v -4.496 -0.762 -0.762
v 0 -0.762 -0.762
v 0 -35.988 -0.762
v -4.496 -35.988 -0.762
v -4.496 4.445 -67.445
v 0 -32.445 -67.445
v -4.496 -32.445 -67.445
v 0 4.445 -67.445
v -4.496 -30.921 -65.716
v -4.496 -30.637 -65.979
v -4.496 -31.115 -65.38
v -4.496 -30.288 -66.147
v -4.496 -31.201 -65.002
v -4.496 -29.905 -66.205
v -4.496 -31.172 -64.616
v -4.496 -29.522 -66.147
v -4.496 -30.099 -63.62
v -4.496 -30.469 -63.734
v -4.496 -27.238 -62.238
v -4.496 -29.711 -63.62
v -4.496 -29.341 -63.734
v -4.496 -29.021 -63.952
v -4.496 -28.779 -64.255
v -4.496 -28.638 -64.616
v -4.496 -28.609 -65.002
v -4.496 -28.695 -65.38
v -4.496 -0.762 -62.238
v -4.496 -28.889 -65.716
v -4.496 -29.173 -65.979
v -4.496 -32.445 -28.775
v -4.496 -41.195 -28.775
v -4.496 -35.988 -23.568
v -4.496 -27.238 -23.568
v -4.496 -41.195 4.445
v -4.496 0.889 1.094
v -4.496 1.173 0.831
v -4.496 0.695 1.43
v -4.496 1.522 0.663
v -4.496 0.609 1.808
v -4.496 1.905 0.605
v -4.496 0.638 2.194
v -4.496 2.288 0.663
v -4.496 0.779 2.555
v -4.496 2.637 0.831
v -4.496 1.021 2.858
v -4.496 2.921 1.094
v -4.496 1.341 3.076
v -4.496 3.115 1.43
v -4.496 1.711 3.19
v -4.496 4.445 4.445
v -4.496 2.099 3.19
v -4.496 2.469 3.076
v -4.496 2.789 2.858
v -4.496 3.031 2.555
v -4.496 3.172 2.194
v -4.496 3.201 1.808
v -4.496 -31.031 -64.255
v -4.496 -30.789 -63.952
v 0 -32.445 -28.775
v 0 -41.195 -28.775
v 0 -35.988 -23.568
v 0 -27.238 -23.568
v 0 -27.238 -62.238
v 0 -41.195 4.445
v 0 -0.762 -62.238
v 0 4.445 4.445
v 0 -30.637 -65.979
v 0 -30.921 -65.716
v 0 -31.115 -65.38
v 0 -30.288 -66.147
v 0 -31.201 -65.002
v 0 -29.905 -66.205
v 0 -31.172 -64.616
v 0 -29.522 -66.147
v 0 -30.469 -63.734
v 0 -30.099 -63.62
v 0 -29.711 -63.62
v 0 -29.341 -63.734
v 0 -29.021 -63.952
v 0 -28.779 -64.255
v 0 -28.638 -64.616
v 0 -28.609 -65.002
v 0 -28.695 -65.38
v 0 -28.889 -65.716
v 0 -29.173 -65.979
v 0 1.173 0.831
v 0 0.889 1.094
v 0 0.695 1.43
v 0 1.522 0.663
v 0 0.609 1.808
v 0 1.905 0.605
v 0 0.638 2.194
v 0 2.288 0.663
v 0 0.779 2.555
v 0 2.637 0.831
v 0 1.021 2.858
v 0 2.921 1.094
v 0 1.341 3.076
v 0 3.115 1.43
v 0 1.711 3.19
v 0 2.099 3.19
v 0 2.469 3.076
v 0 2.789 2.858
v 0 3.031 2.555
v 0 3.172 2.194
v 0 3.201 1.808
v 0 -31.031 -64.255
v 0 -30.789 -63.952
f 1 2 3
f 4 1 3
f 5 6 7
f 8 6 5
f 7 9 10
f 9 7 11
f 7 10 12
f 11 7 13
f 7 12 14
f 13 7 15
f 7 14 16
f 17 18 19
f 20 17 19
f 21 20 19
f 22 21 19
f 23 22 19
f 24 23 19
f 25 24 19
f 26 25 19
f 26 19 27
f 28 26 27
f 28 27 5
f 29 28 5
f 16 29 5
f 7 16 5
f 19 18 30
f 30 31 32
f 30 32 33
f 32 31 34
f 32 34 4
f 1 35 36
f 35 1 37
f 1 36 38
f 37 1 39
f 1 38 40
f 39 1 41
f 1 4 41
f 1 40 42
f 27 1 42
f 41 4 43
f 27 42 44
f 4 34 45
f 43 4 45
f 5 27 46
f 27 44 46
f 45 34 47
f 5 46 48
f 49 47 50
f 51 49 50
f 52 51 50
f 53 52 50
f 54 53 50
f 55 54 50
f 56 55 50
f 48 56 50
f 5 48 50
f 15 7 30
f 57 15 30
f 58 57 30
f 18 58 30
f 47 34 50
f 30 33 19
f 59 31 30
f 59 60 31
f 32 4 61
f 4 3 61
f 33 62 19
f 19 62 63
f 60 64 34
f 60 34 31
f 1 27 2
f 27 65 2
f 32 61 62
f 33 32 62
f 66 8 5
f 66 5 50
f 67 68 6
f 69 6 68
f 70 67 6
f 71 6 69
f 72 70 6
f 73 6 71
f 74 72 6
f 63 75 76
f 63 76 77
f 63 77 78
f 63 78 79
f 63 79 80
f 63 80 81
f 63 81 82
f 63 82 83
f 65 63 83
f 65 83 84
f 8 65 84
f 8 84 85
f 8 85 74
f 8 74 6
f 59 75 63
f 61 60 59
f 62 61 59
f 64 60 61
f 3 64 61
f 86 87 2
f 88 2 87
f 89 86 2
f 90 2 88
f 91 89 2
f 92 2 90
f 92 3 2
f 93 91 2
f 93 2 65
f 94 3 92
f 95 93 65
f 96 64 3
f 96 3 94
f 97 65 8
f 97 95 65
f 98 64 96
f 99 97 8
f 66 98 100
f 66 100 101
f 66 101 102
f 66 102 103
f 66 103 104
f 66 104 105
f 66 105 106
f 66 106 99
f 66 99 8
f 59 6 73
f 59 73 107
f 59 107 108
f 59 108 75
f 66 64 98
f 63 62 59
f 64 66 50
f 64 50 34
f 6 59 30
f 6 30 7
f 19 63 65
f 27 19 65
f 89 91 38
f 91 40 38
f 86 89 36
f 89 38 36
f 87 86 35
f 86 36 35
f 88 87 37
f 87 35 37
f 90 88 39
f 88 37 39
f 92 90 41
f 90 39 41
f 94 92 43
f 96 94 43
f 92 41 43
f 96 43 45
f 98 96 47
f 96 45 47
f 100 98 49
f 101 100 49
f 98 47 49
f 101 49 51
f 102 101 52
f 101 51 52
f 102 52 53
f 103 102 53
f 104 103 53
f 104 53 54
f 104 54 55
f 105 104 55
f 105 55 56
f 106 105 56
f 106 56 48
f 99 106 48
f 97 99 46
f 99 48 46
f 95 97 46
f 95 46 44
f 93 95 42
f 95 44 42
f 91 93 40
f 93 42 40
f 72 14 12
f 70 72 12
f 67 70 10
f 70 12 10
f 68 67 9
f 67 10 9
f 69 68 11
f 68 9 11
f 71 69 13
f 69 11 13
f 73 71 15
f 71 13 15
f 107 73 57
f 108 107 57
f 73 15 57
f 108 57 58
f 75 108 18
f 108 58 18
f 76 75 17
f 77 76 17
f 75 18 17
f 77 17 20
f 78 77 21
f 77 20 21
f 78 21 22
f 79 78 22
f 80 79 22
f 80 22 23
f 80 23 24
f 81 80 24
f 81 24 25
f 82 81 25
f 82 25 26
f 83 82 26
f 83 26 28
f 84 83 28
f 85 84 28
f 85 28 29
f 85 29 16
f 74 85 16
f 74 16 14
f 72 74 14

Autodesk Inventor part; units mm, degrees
ref_plane "YZ Plane" through (0, 0, 0) normal (1, 0, 0) x (0, 1, 0)
ref_plane "XZ Plane" through (0, 0, 0) normal (0, 1, 0) x (-1, 0, 0)
ref_plane "XY Plane" through (0, 0, 0) normal (0, 0, 1) x (1, 0, 0)
sketch "Sketch1" plane through (0, 0, 0) normal (1, 0, 0) x (0, 1, 0)
  line L0 (0, 18.823) -> (0, -81.823) projected
  line L1 (-50.323, 0) -> (13.573, 0) projected
  line L2 (0, 0) -> (0, -63)
  line L3 (0, -63) -> (-28, -63)
  line L4 (-28, -63) -> (-28, -24.33)
  line L5 (-28, -24.33) -> (-36.75, -24.33)
  line L6 (-36.75, -24.33) -> (-36.75, 0)
  line L7 (-36.75, 0) -> (0, 0)
  circle A0 centre (-16, -42.5) radius 1.575 construction
  line L8 (-35.988, -0.762) -> (-35.988, -23.568)
  line L9 (-35.988, -23.568) -> (-27.238, -23.568)
  line L10 (-27.238, -23.568) -> (-27.238, -62.238)
  line L11 (-27.238, -62.238) -> (-0.762, -62.238)
  line L12 (-0.762, -62.238) -> (-0.762, -0.762)
  line L13 (-0.762, -0.762) -> (-35.988, -0.762)
  line L14 (-41.195, 4.445) -> (-41.195, -28.775)
  line L15 (-41.195, -28.775) -> (-32.445, -28.775)
  line L16 (-32.445, -28.775) -> (-32.445, -67.445)
  line L17 (-32.445, -67.445) -> (4.445, -67.445)
  line L18 (4.445, -67.445) -> (4.445, 4.445)
  line L19 (4.445, 4.445) -> (-41.195, 4.445)
  line L20 (1.905, 1.905) -> (-29.905, 1.905) construction
  line L21 (-29.905, 1.905) -> (-29.905, -64.905) construction
  line L22 (-29.905, -64.905) -> (1.905, -64.905) construction
  line L23 (1.905, -64.905) -> (1.905, 1.905) construction
  dimension "d0" = 63
  dimension "d1" = 28
  dimension "d2" = 36.75
  dimension "d3" = 24.33
  dimension "d4" = 42.5
  dimension "d5" = 16
  dimension "d6" = 3.15
  dimension "d16" = 0.762
  dimension "d17" = 4.445
  dimension "d18" = 2.54
  dimension "d19" = 2.54
  dimension "d20" = 2.54
  dimension "d21" = 2.54
  dimension "d29" = 66.81
  dimension "d30" = 31.81
extrude "Extrusion1" add sketch "Sketch1" against normal blind 4.4958
hole "Hole1" at (0, -16, -42.5) direction (-1, 0, 0) diameter 3.15 end through all
hole "Hole2" at (0, 1.905, 1.905) at (0, -29.905, -64.905) direction (-1, 0, 0) diameter 2.6 end through all
equation "\"d20\" = d18"
equation "\"d21\" = d18"
properties part number "J010359" material "ACRYLIC, BLACK"
